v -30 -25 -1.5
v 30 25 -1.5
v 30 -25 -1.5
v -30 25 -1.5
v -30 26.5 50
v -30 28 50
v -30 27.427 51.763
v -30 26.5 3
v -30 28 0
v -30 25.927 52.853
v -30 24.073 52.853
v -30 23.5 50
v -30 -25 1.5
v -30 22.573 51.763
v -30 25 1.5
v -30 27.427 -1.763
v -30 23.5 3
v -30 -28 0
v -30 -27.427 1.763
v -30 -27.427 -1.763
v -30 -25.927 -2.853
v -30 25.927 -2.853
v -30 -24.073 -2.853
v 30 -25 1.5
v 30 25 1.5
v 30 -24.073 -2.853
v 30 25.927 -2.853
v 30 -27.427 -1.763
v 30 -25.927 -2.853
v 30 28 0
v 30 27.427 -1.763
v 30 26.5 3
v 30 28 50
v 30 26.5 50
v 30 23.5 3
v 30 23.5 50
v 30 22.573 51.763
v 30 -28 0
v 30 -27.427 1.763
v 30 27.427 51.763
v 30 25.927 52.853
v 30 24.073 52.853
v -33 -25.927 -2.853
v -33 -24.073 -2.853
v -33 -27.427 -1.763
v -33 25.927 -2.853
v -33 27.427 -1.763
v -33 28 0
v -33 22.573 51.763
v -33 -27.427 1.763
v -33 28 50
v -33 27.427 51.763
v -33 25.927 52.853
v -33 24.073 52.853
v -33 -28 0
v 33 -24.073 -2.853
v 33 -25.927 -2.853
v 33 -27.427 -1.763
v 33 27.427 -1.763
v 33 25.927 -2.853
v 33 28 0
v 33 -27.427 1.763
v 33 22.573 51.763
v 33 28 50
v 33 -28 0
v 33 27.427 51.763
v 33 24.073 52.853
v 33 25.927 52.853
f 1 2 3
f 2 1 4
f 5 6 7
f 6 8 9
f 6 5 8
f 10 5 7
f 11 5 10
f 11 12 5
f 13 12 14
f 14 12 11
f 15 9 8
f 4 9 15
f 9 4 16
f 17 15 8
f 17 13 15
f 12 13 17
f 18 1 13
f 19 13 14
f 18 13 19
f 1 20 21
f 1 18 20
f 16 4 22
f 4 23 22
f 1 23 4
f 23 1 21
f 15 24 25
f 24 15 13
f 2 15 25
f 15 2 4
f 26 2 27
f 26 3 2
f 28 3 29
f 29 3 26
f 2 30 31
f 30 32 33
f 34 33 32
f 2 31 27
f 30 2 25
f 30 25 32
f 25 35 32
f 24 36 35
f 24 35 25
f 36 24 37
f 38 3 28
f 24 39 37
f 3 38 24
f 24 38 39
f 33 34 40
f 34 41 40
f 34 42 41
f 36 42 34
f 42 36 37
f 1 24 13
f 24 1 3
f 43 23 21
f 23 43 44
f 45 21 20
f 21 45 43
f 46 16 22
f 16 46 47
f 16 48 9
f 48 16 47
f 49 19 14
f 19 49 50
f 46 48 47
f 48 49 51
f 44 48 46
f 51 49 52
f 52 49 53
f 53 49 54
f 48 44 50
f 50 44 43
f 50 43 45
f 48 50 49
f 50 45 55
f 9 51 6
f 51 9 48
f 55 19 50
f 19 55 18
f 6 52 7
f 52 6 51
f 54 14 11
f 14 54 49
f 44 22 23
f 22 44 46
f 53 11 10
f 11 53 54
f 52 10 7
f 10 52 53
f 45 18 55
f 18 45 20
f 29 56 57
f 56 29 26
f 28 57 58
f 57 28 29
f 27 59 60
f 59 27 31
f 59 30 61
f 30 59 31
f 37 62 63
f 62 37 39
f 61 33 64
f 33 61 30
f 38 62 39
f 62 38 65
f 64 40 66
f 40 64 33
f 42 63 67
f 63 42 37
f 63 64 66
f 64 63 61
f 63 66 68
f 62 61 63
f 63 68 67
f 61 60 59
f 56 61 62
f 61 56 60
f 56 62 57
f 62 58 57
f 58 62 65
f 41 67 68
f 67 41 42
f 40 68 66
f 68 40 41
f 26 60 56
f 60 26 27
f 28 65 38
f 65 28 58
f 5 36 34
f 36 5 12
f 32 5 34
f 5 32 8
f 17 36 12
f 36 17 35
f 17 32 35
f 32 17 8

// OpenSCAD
// file: parts/rear_panel.scad
include <../config.scad>

module RearPanel()
{
  square([WIDTH, HEIGHT - MATERIAL_THICKNESS], center=true);
}

RearPanel();
// file: parts/side_panel.scad
include <../config.scad>

module SidePanel()
{
  half_depth = DEPTH / 2;

  hull()
  {
    translate([half_depth, 0])
      circle(r=SIDE_PANEL_CORNER_RADIUS);

    translate([-half_depth, 0])
    {
      circle(r=SIDE_PANEL_CORNER_RADIUS);

      translate([0, HEIGHT])
        circle(r=SIDE_PANEL_CORNER_RADIUS);
    }
  }
}

SidePanel();
// file: parts/bottom_panel.scad
include <../config.scad>

module BottomPanel()
{
  square([WIDTH, DEPTH], center=true);
}

BottomPanel();
// file: config.scad
/* Material */
MATERIAL_THICKNESS = 3;
MACHINE_TOLERANCE = 0.1;

/* Angle */
DEVICE_ANGLE = 45;

/* Dimensions */
WIDTH = 60;
HEIGHT = 50;

SIDE_PANEL_CORNER_RADIUS = 3;


/* Calculated dimensions */
DEPTH = HEIGHT / tan(DEVICE_ANGLE);
HALF_MATERIAL_THICKNESS = MATERIAL_THICKNESS / 2;
HALF_HEIGHT = (HEIGHT / 2) + HALF_MATERIAL_THICKNESS;
HALF_WIDTH = (WIDTH / 2) + HALF_MATERIAL_THICKNESS;
HALF_DEPTH = (DEPTH / 2);
// main file
include <config.scad>

use <parts/bottom_panel.scad>
use <parts/side_panel.scad>
use <parts/rear_panel.scad>

module ExtrudeAndColour(c)
{
  color(c)
    linear_extrude(height=MATERIAL_THICKNESS, center=true)
      children();
}

ExtrudeAndColour("red")
  BottomPanel();

translate([-HALF_WIDTH, 0, 0])
  rotate([90, 0, -90])
    ExtrudeAndColour("green")
      SidePanel();

translate([HALF_WIDTH, 0, 0])
  rotate([90, 0, -90])
    ExtrudeAndColour("green")
      SidePanel();

translate([0, HALF_DEPTH, HALF_HEIGHT])
  rotate([90, 0, 0])
    ExtrudeAndColour("blue")
      RearPanel();
